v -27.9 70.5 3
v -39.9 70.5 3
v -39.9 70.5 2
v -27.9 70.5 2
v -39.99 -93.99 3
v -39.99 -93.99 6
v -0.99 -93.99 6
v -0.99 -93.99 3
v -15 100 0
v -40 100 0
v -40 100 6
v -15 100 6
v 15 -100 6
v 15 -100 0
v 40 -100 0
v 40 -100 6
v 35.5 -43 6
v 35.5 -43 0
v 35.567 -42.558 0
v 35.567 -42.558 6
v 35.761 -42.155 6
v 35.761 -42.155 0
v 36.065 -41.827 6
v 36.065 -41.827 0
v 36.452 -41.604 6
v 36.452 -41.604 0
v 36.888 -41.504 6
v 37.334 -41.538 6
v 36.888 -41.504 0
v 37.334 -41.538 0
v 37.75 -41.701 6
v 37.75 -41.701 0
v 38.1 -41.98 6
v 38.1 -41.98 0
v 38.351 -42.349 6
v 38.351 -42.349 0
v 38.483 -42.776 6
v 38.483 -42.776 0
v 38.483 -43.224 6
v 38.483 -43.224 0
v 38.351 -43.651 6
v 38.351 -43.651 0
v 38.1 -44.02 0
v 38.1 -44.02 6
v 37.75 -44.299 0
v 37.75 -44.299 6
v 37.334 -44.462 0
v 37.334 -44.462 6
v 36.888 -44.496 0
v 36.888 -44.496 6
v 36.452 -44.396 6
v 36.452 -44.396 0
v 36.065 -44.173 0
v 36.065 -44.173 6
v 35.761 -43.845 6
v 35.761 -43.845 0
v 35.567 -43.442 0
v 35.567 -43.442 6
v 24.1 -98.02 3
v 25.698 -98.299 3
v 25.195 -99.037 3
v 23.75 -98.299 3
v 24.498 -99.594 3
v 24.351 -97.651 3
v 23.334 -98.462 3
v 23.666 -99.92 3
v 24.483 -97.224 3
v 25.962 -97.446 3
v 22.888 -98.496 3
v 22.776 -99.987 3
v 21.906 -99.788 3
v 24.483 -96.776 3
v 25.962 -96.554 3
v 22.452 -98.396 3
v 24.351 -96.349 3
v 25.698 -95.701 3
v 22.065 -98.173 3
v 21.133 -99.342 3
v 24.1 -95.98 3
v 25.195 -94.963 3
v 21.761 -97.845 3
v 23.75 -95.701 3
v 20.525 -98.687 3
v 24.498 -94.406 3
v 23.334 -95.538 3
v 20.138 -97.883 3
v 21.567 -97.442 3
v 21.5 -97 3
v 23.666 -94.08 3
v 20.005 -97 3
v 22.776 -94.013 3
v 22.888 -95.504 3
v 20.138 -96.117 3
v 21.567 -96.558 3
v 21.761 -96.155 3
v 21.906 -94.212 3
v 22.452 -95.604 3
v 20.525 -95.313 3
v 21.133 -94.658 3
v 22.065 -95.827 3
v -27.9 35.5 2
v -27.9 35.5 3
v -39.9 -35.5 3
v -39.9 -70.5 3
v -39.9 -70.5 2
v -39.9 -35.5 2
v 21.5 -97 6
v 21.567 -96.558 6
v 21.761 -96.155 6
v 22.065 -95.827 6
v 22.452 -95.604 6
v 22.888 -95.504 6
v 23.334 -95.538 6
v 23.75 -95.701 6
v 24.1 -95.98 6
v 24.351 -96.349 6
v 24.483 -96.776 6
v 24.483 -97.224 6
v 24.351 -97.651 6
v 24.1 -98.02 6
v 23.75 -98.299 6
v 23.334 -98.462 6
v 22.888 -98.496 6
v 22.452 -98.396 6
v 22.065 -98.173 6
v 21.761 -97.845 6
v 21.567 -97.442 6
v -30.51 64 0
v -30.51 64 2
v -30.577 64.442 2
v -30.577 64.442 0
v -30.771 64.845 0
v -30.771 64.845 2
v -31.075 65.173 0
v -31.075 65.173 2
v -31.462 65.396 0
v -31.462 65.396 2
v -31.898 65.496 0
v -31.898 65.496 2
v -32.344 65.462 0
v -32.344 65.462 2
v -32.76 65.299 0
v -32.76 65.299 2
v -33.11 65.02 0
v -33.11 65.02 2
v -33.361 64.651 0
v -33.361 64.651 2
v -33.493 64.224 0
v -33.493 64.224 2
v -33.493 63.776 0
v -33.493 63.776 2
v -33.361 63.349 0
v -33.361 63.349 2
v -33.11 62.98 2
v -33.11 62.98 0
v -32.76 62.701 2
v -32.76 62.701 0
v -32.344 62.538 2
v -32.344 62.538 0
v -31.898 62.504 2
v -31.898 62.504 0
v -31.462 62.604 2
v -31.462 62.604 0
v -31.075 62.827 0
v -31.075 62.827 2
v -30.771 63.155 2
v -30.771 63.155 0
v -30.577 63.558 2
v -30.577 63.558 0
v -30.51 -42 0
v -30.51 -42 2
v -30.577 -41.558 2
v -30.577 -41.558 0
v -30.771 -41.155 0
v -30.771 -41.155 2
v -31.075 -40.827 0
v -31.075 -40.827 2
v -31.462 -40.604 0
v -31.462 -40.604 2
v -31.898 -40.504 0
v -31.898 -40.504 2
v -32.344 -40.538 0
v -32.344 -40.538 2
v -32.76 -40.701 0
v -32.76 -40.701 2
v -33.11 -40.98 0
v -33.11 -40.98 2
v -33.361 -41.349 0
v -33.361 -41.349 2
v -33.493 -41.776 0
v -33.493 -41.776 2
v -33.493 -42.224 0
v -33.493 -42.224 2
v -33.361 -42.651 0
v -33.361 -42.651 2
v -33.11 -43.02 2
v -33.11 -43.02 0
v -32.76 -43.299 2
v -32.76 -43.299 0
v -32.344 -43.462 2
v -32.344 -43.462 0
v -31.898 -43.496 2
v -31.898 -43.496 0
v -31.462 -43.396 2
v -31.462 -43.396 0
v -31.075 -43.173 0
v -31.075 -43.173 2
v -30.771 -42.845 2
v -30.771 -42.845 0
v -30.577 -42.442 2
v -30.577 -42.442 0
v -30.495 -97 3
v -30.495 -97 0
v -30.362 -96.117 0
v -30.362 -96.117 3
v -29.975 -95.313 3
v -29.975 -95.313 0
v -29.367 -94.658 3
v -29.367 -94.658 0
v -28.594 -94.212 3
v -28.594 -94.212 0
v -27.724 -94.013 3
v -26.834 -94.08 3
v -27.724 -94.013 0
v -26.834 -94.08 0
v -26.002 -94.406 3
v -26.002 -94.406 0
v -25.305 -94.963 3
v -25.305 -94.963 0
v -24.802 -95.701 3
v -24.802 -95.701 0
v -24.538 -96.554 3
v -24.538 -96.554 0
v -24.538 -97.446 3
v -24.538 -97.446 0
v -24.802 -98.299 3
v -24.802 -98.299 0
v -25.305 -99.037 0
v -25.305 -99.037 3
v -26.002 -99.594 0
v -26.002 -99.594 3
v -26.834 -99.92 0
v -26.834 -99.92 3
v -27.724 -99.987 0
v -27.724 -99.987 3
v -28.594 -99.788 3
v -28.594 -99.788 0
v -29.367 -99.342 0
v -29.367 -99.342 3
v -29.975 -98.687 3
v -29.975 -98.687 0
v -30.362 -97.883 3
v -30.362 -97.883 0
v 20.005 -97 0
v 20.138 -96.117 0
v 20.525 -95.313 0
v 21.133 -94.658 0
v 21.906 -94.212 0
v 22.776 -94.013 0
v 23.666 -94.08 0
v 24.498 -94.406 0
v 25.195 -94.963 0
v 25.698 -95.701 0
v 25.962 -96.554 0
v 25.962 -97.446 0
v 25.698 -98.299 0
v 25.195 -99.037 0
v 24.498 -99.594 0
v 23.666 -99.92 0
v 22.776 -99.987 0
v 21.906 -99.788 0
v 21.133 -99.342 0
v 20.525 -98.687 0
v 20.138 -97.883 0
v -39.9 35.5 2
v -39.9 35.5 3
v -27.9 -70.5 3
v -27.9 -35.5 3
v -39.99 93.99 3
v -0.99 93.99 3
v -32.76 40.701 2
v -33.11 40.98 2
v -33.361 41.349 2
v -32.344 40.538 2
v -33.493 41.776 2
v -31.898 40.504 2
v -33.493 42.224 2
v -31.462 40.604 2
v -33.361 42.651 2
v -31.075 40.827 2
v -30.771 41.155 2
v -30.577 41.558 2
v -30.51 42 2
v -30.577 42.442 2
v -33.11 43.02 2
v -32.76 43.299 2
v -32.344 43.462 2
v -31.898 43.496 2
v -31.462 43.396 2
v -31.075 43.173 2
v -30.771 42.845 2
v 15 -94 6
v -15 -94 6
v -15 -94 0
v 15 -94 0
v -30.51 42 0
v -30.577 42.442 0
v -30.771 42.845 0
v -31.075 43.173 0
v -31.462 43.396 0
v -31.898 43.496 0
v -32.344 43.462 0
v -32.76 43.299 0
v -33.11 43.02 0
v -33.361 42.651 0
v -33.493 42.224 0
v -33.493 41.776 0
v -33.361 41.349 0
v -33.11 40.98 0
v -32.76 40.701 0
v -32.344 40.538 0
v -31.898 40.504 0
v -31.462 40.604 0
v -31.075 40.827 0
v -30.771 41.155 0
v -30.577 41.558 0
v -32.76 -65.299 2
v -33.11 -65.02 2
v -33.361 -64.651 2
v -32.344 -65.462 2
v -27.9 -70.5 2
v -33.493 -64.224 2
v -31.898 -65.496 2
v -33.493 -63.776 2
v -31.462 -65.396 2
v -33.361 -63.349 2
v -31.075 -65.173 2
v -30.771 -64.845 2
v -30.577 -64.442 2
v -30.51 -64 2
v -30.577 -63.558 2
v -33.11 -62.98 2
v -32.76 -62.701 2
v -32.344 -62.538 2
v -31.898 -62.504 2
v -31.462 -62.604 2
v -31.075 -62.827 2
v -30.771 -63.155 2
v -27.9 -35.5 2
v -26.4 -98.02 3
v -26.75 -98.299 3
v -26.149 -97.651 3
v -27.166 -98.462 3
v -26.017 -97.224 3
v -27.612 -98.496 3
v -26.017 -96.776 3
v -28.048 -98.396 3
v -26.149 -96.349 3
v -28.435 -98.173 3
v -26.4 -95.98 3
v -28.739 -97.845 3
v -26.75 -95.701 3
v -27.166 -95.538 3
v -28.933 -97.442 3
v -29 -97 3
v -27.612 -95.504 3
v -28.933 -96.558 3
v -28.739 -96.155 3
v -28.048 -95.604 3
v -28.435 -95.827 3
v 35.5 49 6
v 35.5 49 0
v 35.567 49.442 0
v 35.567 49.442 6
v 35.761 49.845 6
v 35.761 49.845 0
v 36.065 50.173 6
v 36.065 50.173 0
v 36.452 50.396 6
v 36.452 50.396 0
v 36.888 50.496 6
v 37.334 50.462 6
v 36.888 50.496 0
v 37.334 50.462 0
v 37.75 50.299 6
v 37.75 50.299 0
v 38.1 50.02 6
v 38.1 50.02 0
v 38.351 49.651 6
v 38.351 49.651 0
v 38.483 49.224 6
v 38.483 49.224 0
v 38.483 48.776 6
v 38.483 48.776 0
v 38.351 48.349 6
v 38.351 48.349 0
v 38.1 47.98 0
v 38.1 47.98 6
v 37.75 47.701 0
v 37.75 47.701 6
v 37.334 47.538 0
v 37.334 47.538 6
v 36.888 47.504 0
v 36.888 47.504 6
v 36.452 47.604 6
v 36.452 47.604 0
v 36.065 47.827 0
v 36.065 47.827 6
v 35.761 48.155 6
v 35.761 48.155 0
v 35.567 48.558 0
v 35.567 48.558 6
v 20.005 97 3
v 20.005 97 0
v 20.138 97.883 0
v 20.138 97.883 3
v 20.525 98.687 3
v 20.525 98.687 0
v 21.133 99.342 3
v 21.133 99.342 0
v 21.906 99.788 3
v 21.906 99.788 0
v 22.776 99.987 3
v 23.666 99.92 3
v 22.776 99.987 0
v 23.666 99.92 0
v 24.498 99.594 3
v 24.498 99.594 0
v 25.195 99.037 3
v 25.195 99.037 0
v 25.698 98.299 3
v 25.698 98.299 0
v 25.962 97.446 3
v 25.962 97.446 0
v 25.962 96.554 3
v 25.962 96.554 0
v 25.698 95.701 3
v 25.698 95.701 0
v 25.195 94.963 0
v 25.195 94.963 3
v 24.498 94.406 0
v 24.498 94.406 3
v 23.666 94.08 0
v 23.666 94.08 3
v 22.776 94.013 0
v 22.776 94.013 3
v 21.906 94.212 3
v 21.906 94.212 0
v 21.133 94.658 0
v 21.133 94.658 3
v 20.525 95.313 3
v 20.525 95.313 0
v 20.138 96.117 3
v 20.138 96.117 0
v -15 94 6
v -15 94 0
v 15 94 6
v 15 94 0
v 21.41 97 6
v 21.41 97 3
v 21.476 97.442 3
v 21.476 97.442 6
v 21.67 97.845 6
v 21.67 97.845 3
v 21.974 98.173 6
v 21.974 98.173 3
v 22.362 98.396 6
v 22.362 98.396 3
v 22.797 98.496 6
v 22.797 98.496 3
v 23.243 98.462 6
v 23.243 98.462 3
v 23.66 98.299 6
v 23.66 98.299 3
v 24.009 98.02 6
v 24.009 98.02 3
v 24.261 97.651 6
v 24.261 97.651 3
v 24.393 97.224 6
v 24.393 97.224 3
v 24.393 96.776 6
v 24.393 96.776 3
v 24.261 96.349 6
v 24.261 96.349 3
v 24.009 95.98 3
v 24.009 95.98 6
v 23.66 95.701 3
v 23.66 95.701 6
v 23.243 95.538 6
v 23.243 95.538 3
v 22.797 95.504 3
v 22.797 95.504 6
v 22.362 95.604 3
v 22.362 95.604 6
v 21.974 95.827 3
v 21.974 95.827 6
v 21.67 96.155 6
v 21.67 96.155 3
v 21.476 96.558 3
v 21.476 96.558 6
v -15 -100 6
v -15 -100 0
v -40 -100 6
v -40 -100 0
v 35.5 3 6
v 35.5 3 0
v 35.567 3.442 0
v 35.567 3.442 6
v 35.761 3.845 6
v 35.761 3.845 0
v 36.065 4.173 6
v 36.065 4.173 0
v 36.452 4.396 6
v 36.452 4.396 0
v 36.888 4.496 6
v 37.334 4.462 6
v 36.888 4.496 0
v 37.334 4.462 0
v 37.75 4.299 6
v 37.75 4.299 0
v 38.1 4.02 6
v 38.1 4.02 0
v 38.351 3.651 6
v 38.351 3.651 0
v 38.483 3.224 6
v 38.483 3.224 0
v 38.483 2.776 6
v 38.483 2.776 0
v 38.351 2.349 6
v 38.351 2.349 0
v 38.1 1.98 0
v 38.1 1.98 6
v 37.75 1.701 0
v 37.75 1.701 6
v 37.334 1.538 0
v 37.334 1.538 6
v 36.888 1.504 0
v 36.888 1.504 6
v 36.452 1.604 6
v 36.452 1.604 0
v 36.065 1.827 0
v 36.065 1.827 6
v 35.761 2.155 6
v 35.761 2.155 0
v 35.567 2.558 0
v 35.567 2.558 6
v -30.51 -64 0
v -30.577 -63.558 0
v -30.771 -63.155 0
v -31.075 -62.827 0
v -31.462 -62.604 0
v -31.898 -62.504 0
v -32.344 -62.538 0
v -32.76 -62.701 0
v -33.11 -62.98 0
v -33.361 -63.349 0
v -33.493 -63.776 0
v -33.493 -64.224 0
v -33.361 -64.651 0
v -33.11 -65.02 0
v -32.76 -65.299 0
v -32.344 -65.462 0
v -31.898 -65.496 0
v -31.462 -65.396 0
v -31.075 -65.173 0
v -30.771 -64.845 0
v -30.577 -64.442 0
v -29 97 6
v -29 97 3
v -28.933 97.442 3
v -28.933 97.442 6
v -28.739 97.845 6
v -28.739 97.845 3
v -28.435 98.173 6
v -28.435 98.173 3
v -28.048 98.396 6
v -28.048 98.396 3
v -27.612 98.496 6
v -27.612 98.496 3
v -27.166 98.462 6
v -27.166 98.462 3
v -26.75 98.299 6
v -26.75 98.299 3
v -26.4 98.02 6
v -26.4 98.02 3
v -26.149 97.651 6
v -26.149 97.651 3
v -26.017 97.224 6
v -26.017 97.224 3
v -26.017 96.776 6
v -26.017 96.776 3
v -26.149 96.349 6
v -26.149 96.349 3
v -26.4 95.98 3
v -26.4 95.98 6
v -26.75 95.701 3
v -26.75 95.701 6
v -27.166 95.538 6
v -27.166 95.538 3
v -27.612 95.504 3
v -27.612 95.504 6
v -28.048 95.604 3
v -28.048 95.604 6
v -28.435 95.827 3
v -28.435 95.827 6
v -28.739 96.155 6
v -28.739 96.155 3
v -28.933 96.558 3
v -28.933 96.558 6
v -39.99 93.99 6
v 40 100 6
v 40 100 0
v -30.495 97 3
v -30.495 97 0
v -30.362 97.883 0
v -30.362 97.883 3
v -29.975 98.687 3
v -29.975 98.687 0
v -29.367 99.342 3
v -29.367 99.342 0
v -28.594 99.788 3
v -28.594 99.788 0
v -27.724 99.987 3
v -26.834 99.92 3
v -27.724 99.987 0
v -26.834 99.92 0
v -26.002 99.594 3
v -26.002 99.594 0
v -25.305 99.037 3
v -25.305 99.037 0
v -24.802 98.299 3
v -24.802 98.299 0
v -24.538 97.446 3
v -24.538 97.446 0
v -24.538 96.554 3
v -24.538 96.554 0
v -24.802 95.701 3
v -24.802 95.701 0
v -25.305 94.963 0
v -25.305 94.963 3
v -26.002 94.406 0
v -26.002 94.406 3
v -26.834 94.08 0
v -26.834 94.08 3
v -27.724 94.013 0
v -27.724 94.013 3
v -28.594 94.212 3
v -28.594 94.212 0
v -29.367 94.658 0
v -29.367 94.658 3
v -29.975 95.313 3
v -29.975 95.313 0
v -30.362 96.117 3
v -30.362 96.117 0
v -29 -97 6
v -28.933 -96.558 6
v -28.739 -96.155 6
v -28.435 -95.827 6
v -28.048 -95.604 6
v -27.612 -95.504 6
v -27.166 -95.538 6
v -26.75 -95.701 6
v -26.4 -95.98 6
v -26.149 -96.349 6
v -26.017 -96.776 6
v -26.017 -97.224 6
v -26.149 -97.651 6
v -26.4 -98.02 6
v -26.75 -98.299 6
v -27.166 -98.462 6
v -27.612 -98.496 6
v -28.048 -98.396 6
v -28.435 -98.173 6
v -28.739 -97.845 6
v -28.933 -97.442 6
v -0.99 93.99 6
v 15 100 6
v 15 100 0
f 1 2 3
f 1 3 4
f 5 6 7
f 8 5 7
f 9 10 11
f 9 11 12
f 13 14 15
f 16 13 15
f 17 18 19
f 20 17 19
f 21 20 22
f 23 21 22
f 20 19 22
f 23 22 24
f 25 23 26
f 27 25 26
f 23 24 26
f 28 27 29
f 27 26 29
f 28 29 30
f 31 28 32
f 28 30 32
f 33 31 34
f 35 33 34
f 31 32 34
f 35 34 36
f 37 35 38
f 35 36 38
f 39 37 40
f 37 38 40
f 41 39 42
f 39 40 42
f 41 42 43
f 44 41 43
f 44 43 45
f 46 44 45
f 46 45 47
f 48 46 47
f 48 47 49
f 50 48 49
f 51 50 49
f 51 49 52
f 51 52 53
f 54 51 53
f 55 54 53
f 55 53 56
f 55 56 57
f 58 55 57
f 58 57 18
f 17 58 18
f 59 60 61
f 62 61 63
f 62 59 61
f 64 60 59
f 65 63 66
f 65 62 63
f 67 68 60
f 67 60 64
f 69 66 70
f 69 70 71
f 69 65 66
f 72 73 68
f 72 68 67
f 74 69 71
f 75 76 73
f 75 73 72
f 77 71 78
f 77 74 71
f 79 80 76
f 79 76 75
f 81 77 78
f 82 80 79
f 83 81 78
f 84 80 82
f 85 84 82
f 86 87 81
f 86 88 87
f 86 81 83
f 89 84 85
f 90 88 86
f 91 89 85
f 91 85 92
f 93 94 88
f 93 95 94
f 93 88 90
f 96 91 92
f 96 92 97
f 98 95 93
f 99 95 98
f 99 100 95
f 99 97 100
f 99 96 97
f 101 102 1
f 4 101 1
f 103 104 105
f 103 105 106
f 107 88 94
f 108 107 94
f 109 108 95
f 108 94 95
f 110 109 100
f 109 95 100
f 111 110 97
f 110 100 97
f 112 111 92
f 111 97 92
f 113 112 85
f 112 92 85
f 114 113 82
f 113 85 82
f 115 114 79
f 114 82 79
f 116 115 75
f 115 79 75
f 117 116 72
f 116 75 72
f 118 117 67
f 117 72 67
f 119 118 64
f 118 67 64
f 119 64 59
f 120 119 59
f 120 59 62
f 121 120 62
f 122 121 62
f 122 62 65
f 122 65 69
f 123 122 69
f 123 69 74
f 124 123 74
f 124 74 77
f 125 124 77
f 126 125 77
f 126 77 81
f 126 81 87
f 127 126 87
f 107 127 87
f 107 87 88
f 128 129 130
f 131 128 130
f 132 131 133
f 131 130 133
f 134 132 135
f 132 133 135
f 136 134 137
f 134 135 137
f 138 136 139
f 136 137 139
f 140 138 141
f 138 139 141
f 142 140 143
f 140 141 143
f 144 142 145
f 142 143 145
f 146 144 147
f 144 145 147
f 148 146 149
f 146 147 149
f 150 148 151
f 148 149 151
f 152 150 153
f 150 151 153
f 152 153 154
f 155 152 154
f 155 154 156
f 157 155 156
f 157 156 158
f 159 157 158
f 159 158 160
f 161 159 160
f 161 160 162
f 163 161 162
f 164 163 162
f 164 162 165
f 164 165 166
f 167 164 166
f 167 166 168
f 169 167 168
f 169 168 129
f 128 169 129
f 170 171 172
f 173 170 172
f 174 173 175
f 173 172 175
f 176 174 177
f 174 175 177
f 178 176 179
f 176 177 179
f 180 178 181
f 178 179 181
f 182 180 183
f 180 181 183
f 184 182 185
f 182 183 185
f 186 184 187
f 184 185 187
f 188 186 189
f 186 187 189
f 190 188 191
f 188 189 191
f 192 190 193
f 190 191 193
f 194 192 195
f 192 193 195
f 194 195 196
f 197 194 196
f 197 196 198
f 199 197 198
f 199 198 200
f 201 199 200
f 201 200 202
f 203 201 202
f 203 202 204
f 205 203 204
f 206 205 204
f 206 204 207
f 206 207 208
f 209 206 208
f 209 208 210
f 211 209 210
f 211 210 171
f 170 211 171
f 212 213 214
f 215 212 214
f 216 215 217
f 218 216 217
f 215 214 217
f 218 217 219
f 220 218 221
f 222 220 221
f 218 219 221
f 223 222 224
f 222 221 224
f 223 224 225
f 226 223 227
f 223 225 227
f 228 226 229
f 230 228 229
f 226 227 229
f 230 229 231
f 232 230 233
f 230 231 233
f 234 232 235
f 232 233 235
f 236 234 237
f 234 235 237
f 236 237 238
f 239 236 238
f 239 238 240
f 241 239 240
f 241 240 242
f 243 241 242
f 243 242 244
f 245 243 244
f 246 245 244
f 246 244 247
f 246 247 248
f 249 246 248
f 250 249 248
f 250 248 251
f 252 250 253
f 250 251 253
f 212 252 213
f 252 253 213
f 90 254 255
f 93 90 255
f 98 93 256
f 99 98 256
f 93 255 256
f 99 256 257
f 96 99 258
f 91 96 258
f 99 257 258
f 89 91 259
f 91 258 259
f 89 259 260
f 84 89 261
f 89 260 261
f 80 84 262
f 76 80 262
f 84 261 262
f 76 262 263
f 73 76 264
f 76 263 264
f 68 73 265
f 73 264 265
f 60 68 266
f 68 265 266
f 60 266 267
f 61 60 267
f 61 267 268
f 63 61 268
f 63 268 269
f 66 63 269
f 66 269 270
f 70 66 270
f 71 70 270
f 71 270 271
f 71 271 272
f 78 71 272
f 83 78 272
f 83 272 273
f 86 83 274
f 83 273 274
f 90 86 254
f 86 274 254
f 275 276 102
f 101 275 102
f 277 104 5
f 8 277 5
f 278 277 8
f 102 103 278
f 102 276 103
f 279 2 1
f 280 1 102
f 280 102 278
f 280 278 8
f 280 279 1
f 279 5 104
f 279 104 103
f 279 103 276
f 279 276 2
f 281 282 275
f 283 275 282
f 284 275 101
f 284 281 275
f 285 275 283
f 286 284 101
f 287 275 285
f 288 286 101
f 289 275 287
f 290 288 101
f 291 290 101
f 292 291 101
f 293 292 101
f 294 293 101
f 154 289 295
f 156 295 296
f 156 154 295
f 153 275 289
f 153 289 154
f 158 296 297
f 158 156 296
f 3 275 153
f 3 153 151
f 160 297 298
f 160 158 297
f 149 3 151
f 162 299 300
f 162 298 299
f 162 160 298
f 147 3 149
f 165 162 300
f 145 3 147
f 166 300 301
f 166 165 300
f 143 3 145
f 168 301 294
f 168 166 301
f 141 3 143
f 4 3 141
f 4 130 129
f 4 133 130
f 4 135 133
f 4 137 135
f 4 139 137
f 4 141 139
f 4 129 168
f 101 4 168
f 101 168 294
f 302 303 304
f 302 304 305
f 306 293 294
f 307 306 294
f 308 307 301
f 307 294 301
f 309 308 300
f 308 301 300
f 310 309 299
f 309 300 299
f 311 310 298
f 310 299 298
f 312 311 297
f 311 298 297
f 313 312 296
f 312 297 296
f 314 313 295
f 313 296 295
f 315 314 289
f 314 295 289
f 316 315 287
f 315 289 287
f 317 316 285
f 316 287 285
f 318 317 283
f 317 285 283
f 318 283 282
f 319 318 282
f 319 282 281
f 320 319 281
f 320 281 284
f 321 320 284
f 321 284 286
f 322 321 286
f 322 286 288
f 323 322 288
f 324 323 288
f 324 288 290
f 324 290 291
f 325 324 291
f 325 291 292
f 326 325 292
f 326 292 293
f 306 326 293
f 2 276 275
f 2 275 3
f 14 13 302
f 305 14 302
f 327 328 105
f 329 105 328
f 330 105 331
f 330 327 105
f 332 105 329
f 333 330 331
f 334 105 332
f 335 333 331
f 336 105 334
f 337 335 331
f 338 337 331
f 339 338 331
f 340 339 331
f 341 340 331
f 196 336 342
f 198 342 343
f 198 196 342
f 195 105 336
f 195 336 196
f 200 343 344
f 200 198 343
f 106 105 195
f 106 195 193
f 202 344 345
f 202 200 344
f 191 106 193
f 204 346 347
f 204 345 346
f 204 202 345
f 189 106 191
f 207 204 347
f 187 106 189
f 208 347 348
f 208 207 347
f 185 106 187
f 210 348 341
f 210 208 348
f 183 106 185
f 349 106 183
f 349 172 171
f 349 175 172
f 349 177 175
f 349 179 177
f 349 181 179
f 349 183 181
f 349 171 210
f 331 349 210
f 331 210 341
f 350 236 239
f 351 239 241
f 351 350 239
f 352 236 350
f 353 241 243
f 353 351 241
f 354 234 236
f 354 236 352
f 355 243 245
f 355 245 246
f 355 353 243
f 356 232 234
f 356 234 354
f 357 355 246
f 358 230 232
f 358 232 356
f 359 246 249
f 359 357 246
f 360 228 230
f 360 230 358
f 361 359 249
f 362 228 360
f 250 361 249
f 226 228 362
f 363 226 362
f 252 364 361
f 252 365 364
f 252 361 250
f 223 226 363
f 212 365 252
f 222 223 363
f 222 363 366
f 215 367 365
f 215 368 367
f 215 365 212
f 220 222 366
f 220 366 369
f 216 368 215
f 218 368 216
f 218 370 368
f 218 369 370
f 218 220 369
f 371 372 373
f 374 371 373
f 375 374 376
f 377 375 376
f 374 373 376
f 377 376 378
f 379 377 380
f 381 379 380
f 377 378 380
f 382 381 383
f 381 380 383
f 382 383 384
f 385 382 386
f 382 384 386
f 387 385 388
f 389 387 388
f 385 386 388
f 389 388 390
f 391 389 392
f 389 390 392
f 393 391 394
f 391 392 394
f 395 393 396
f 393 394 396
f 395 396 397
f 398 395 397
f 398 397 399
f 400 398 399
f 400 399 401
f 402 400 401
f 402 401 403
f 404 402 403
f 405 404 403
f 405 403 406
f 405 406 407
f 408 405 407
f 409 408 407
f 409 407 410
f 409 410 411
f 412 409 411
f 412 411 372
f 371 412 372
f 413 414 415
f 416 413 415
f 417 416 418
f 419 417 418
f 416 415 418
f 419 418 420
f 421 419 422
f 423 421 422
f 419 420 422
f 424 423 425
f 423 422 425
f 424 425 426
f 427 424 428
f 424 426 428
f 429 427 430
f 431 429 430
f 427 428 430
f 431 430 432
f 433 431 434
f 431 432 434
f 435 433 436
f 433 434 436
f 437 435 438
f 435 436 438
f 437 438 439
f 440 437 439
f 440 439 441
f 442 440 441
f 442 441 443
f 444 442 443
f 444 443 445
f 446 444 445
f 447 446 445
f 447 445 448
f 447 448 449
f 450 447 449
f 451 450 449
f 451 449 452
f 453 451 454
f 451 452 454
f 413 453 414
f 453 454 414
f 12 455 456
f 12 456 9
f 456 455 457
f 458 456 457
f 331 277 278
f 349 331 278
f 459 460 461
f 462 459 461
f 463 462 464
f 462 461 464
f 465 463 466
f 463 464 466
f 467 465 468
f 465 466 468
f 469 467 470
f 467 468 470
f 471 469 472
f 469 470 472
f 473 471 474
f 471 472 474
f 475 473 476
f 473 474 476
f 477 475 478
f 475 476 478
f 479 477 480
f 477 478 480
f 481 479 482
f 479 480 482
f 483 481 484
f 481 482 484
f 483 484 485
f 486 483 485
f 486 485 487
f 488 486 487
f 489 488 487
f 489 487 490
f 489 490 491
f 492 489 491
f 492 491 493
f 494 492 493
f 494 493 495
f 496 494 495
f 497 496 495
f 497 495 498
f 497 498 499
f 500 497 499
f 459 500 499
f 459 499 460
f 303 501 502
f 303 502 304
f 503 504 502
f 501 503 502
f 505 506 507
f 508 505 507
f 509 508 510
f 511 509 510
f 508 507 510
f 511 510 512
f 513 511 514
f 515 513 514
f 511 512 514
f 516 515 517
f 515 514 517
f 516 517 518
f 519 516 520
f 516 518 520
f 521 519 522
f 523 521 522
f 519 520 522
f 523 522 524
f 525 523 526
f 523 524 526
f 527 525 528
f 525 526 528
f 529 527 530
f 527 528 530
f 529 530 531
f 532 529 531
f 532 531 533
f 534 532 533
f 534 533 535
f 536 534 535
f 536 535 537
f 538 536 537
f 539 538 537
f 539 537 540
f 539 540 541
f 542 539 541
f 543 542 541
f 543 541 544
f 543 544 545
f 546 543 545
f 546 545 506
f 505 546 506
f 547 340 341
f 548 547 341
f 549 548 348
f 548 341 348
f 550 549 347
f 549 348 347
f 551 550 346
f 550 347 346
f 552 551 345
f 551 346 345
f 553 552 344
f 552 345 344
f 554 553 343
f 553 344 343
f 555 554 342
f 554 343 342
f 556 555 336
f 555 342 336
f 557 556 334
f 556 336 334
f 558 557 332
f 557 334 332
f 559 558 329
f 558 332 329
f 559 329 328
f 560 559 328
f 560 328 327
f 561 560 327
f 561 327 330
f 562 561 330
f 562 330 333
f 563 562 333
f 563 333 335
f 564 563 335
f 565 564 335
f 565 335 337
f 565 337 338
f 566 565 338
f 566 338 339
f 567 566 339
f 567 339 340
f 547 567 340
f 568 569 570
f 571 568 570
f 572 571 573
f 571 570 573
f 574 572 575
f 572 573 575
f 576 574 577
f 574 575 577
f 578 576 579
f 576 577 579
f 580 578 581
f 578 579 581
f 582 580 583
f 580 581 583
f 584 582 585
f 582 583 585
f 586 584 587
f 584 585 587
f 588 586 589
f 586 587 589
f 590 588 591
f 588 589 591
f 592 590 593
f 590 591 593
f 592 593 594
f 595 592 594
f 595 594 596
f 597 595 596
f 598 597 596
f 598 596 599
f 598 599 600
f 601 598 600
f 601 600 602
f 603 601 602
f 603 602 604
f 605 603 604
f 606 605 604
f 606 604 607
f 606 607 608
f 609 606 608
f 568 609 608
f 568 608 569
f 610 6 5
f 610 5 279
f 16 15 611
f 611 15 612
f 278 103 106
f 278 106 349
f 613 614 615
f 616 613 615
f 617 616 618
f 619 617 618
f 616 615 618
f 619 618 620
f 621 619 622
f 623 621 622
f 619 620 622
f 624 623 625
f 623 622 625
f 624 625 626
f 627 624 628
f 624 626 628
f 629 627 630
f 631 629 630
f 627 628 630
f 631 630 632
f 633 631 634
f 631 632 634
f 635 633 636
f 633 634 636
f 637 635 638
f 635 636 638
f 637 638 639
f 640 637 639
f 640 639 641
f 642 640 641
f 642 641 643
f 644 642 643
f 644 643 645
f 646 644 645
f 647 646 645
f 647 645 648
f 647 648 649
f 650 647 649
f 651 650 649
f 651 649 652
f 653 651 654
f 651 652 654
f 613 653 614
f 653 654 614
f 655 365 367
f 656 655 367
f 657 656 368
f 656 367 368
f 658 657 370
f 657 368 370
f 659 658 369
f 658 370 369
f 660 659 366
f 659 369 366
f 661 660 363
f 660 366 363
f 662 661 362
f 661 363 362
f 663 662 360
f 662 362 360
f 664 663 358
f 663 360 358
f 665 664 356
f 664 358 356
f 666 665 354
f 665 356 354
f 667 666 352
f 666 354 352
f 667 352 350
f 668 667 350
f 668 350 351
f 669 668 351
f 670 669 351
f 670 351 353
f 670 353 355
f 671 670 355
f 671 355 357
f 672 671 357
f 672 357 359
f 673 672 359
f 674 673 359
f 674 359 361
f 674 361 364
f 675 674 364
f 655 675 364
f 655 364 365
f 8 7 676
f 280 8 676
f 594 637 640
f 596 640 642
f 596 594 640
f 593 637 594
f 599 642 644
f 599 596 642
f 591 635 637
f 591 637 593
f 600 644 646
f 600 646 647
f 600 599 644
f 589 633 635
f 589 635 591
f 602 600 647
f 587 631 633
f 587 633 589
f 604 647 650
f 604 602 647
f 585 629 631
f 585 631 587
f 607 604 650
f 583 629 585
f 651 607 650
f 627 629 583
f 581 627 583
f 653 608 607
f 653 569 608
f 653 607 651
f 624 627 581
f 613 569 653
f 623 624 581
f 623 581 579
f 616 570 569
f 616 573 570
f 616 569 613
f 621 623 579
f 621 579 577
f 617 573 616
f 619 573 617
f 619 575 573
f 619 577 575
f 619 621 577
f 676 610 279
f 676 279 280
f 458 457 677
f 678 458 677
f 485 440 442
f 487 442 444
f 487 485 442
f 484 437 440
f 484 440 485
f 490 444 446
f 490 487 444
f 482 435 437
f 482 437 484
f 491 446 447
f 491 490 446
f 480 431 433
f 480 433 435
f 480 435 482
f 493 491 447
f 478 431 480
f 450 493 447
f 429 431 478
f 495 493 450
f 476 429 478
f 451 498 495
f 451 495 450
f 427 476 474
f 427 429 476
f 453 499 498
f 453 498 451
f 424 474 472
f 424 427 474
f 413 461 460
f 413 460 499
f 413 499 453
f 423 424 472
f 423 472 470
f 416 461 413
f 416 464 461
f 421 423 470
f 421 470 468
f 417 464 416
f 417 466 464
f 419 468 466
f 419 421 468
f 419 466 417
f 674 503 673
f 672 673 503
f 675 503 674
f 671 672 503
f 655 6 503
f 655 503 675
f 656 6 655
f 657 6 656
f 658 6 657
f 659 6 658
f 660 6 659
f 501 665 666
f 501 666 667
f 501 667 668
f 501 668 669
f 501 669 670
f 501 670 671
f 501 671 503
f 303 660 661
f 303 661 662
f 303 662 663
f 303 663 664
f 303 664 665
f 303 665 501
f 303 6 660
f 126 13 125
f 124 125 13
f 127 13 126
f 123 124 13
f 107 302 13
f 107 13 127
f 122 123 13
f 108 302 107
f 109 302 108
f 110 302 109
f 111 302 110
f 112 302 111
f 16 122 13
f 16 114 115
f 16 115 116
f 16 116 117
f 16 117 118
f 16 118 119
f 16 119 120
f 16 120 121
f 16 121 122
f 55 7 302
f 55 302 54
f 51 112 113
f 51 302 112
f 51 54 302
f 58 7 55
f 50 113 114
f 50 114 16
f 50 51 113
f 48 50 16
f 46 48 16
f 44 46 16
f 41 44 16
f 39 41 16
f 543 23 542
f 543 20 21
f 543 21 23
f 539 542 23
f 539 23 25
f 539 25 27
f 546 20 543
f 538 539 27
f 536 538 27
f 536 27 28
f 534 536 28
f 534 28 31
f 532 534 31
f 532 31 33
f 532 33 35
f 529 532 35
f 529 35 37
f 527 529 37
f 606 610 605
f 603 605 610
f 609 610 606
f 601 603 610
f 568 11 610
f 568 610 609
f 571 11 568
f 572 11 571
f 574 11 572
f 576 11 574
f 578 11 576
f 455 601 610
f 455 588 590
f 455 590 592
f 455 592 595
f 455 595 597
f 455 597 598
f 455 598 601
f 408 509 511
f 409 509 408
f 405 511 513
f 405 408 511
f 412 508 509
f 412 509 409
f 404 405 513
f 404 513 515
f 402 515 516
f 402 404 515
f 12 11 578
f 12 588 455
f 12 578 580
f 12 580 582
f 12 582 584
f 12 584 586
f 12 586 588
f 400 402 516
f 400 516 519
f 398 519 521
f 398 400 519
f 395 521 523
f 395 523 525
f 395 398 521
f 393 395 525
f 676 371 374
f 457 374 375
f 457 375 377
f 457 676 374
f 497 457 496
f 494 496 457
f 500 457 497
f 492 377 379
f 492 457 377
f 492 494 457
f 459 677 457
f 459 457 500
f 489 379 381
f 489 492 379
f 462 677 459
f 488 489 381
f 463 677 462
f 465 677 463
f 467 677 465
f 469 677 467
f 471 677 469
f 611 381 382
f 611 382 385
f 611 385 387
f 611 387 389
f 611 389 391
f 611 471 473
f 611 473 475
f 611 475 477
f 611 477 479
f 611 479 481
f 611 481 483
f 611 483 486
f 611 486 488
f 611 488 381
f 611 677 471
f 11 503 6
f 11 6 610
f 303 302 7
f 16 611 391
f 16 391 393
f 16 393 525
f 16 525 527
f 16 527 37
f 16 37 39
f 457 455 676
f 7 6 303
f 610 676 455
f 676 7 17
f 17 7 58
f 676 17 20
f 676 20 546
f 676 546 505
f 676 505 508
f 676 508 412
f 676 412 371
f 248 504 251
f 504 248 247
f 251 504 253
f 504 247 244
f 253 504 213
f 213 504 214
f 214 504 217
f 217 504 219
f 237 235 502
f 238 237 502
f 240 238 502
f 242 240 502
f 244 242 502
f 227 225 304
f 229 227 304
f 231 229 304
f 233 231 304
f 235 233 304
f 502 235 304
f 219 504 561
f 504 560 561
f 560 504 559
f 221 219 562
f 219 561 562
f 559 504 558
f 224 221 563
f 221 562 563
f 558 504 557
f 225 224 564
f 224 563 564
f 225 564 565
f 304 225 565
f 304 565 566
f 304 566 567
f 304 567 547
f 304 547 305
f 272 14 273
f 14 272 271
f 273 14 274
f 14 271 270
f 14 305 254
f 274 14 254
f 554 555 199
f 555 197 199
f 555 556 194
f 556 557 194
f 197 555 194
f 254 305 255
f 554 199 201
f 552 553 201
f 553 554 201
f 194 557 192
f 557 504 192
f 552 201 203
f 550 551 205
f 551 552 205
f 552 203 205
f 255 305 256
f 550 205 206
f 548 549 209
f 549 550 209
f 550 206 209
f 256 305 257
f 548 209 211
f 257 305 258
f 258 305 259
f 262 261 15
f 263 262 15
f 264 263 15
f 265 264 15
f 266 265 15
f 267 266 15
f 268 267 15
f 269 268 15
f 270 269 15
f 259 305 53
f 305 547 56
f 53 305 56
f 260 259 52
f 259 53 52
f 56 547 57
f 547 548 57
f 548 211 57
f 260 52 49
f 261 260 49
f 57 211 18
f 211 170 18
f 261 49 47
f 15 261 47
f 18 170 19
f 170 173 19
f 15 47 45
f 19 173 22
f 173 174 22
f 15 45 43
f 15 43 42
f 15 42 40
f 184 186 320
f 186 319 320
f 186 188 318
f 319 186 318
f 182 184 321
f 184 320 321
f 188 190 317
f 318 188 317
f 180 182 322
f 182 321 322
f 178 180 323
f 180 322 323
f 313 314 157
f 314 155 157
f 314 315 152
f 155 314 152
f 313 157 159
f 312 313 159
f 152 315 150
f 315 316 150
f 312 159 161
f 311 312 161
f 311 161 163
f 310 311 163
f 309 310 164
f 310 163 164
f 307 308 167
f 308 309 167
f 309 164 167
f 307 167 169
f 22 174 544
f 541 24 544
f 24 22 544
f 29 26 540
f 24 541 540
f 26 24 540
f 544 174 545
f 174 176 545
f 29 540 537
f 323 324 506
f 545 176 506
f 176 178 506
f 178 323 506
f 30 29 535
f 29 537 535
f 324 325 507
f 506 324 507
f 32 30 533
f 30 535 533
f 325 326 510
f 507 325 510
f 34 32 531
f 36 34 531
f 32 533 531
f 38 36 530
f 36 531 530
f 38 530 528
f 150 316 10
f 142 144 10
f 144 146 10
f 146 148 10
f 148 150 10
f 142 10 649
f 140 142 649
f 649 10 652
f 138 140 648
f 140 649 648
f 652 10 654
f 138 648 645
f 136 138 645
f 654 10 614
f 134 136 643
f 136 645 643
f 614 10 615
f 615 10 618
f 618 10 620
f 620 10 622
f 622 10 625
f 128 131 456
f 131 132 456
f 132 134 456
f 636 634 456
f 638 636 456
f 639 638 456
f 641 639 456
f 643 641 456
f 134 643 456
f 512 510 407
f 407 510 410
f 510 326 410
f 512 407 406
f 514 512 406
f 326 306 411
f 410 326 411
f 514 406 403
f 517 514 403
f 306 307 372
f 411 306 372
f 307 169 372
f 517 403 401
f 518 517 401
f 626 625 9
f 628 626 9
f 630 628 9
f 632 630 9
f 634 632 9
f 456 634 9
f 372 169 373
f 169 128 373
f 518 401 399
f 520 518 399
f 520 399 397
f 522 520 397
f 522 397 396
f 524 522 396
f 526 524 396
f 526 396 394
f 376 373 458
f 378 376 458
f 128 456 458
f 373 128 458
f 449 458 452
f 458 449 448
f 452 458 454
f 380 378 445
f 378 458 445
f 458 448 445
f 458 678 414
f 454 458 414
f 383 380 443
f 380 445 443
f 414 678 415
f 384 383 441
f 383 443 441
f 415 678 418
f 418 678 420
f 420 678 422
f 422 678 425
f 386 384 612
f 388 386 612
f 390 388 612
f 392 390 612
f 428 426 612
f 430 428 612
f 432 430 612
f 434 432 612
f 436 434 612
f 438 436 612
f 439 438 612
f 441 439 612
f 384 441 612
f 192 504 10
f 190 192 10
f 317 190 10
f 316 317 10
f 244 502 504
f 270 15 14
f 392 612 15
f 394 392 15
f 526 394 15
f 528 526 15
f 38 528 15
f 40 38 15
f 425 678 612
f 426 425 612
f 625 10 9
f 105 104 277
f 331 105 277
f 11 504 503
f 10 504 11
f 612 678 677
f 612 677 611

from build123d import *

# Parameters (mm, degrees)
ESQUISSE1_W             = 80
ESQUISSE1_H             = 200
BOSS_EXTRU_1_DEPTH      = 6
ESQUISSE4_W             = 39
ESQUISSE4_H             = 187.98
ENL_V_MAT_EXTRU_3_DEPTH = 3
ESQUISSE5_W             = 30
ESQUISSE5_H             = 6
ENL_V_MAT_EXTRU_4_DEPTH = 10
ESQUISSE6_R             = 2.995
ENL_V_MAT_EXTRU_5_DEPTH = 3
ESQUISSE7_R             = 1.5
ENL_V_MAT_EXTRU_6_DEPTH = 13
ESQUISSE8_R             = 1.5
ENL_V_MAT_EXTRU_7_DEPTH = 10
ESQUISSE9_R             = 1.5
ENL_V_MAT_EXTRU_8_DEPTH = 10
ESQUISSE10_W            = 12
ESQUISSE10_H            = 35
ENL_V_MAT_EXTRU_9_DEPTH = 1


with BuildPart() as part:
    # Esquisse1 → Boss.-Extru.1 (new body)
    with BuildSketch(Plane.XY):
        Rectangle(ESQUISSE1_W, ESQUISSE1_H)
    extrude(amount=BOSS_EXTRU_1_DEPTH)

    # Esquisse4 → Enlèv. mat.-Extru.3 (cut)
    with BuildSketch(Plane.XY.offset(6)):
        with Locations((-20.49, 0)):
            Rectangle(ESQUISSE4_W, ESQUISSE4_H)
    extrude(amount=-ENL_V_MAT_EXTRU_3_DEPTH, mode=Mode.SUBTRACT)

    # Esquisse5 → Enlèv. mat.-Extru.4 (cut)
    with BuildSketch(Plane.XY.offset(6)):
        with Locations((0, 97)):
            Rectangle(ESQUISSE5_W, ESQUISSE5_H)
        with Locations((0, -97)):
            Rectangle(ESQUISSE5_W, ESQUISSE5_H)
    extrude(amount=-ENL_V_MAT_EXTRU_4_DEPTH, mode=Mode.SUBTRACT)

    # Esquisse6 → Enlèv. mat.-Extru.5 (cut)
    with BuildSketch(Plane(origin=(0, 0, 0), x_dir=(-1, 0, 0), z_dir=(0, 0, -1))):
        with Locations((27.5, -97)):
            Circle(ESQUISSE6_R)
        with Locations((-23, -97)):
            Circle(ESQUISSE6_R)
        with Locations((27.5, 97)):
            Circle(ESQUISSE6_R)
        with Locations((-23, 97)):
            Circle(ESQUISSE6_R)
    extrude(amount=-ENL_V_MAT_EXTRU_5_DEPTH, mode=Mode.SUBTRACT)

    # Esquisse7 → Enlèv. mat.-Extru.6 (cut)
    with BuildSketch(Plane(origin=(0, 0, 0), x_dir=(-1, 0, 0), z_dir=(0, 0, -1))):
        with Locations((27.5, 97)):
            Circle(ESQUISSE7_R)
        with Locations((-22.909579605, 97)):
            Circle(ESQUISSE7_R)
        with Locations((27.5, -97)):
            Circle(ESQUISSE7_R)
        with Locations((-23, -97)):
            Circle(ESQUISSE7_R)
    extrude(amount=-ENL_V_MAT_EXTRU_6_DEPTH, mode=Mode.SUBTRACT)

    # Esquisse8 → Enlèv. mat.-Extru.7 (cut)
    with BuildSketch(Plane.XY.offset(3)):
        with Locations((-32.01, 64)):
            Circle(ESQUISSE8_R)
        with Locations((-32.01, 42)):
            Circle(ESQUISSE8_R)
        with Locations((-32.01, -42)):
            Circle(ESQUISSE8_R)
        with Locations((-32.01, -64)):
            Circle(ESQUISSE8_R)
    extrude(amount=-ENL_V_MAT_EXTRU_7_DEPTH, mode=Mode.SUBTRACT)

    # Esquisse9 → Enlèv. mat.-Extru.8 (cut)
    with BuildSketch(Plane(origin=(0, 0, 0), x_dir=(-1, 0, 0), z_dir=(0, 0, -1))):
        with Locations((-37, -43)):
            Circle(ESQUISSE9_R)
        with Locations((-37, 3)):
            Circle(ESQUISSE9_R)
        with Locations((-37, 49)):
            Circle(ESQUISSE9_R)
    extrude(amount=-ENL_V_MAT_EXTRU_8_DEPTH, mode=Mode.SUBTRACT)

    # Esquisse10 → Enlèv. mat.-Extru.9 (cut)
    with BuildSketch(Plane.XY.offset(3)):
        with Locations((-33.9, 53)):
            Rectangle(ESQUISSE10_W, ESQUISSE10_H)
        with Locations((-33.9, -53)):
            Rectangle(ESQUISSE10_W, ESQUISSE10_H)
    extrude(amount=-ENL_V_MAT_EXTRU_9_DEPTH, mode=Mode.SUBTRACT)


solid = part.part
